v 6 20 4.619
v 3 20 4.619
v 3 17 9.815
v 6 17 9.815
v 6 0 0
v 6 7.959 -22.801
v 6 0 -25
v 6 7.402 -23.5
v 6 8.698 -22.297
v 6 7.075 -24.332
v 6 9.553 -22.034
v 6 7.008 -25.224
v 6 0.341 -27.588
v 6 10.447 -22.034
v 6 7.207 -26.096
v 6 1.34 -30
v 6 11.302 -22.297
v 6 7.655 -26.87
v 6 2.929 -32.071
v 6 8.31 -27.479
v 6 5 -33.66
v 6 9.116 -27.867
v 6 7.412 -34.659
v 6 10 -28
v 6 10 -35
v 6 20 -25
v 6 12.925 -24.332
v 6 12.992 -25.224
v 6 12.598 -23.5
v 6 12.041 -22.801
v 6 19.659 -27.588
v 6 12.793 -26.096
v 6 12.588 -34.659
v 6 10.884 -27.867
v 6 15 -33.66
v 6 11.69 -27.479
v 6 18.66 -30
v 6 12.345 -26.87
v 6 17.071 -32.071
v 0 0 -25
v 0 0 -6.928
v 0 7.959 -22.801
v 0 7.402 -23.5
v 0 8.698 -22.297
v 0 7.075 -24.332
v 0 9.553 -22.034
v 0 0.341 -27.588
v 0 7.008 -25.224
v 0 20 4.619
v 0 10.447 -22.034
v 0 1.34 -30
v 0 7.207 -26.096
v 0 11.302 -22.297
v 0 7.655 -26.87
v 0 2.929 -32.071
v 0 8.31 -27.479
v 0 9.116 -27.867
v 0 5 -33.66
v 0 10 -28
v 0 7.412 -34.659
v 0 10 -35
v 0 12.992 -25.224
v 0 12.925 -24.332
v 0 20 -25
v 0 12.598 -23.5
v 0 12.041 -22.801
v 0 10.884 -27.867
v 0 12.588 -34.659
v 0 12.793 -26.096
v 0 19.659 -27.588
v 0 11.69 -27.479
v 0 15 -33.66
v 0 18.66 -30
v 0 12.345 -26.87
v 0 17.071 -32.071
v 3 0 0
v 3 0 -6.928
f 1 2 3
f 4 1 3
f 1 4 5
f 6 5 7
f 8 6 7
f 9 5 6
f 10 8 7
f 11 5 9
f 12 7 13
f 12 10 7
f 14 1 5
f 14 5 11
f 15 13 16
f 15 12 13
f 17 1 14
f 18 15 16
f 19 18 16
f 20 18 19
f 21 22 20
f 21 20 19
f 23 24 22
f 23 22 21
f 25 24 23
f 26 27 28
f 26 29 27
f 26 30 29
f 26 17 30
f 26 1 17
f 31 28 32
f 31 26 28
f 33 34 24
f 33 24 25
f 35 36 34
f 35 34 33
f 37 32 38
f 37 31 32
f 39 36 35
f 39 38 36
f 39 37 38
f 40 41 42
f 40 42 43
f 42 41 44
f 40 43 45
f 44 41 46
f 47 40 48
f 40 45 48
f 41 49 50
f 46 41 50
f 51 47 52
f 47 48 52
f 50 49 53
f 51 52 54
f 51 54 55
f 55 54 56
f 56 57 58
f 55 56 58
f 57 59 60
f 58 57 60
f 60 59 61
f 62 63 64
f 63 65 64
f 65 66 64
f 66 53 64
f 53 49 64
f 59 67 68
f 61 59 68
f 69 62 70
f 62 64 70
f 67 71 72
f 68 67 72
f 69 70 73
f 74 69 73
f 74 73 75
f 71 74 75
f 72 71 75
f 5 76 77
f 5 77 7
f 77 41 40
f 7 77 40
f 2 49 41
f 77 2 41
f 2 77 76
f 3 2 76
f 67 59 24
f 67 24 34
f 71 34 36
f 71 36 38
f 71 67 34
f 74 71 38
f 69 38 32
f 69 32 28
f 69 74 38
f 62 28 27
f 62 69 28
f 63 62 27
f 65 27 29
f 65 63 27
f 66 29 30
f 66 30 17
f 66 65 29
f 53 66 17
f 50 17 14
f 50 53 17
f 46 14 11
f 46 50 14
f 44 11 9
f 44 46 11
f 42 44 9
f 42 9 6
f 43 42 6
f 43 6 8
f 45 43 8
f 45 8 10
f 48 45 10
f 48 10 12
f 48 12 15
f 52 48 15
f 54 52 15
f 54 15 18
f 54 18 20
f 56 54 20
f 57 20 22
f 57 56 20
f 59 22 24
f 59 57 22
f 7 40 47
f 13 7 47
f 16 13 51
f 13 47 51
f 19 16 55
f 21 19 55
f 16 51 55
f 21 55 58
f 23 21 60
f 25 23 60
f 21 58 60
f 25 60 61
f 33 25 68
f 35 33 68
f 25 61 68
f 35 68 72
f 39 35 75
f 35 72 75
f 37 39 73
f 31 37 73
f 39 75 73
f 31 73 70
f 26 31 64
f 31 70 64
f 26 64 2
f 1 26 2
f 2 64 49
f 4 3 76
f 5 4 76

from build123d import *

# Parameters (mm, degrees)
SKETCH1_R           = 3
BOSS_EXTRUDE1_DEPTH = 6
CUT_EXTRUDE1_DEPTH  = 3


with BuildPart() as part:
    # Sketch1 → Boss-Extrude1 (new body)
    with BuildSketch(Plane(origin=(0, 0, 0), x_dir=(0, 0, -1), z_dir=(1, 0, 0))):
        with BuildLine():
            Line((-4.618802154, 20), (-9.814954576, 17))
            Line((-9.814954576, 17), (0, 0))
            Line((0, 0), (25, 0))
            ThreePointArc((25, 0), (35, 10), (25, 20))
            Line((25, 20), (-4.618802154, 20))
        make_face()
        with Locations((25, 10)):
            Circle(SKETCH1_R, mode=Mode.SUBTRACT)
    extrude(amount=BOSS_EXTRUDE1_DEPTH)

    # Sketch2 → Cut-Extrude1 (cut)
    with BuildSketch(Plane.ZY):
        Polygon((9.814954576, 17), (4.618802154, 20), (-6.92820323, 0), (0, 0), align=None)
    extrude(amount=-CUT_EXTRUDE1_DEPTH, mode=Mode.SUBTRACT)


solid = part.part
